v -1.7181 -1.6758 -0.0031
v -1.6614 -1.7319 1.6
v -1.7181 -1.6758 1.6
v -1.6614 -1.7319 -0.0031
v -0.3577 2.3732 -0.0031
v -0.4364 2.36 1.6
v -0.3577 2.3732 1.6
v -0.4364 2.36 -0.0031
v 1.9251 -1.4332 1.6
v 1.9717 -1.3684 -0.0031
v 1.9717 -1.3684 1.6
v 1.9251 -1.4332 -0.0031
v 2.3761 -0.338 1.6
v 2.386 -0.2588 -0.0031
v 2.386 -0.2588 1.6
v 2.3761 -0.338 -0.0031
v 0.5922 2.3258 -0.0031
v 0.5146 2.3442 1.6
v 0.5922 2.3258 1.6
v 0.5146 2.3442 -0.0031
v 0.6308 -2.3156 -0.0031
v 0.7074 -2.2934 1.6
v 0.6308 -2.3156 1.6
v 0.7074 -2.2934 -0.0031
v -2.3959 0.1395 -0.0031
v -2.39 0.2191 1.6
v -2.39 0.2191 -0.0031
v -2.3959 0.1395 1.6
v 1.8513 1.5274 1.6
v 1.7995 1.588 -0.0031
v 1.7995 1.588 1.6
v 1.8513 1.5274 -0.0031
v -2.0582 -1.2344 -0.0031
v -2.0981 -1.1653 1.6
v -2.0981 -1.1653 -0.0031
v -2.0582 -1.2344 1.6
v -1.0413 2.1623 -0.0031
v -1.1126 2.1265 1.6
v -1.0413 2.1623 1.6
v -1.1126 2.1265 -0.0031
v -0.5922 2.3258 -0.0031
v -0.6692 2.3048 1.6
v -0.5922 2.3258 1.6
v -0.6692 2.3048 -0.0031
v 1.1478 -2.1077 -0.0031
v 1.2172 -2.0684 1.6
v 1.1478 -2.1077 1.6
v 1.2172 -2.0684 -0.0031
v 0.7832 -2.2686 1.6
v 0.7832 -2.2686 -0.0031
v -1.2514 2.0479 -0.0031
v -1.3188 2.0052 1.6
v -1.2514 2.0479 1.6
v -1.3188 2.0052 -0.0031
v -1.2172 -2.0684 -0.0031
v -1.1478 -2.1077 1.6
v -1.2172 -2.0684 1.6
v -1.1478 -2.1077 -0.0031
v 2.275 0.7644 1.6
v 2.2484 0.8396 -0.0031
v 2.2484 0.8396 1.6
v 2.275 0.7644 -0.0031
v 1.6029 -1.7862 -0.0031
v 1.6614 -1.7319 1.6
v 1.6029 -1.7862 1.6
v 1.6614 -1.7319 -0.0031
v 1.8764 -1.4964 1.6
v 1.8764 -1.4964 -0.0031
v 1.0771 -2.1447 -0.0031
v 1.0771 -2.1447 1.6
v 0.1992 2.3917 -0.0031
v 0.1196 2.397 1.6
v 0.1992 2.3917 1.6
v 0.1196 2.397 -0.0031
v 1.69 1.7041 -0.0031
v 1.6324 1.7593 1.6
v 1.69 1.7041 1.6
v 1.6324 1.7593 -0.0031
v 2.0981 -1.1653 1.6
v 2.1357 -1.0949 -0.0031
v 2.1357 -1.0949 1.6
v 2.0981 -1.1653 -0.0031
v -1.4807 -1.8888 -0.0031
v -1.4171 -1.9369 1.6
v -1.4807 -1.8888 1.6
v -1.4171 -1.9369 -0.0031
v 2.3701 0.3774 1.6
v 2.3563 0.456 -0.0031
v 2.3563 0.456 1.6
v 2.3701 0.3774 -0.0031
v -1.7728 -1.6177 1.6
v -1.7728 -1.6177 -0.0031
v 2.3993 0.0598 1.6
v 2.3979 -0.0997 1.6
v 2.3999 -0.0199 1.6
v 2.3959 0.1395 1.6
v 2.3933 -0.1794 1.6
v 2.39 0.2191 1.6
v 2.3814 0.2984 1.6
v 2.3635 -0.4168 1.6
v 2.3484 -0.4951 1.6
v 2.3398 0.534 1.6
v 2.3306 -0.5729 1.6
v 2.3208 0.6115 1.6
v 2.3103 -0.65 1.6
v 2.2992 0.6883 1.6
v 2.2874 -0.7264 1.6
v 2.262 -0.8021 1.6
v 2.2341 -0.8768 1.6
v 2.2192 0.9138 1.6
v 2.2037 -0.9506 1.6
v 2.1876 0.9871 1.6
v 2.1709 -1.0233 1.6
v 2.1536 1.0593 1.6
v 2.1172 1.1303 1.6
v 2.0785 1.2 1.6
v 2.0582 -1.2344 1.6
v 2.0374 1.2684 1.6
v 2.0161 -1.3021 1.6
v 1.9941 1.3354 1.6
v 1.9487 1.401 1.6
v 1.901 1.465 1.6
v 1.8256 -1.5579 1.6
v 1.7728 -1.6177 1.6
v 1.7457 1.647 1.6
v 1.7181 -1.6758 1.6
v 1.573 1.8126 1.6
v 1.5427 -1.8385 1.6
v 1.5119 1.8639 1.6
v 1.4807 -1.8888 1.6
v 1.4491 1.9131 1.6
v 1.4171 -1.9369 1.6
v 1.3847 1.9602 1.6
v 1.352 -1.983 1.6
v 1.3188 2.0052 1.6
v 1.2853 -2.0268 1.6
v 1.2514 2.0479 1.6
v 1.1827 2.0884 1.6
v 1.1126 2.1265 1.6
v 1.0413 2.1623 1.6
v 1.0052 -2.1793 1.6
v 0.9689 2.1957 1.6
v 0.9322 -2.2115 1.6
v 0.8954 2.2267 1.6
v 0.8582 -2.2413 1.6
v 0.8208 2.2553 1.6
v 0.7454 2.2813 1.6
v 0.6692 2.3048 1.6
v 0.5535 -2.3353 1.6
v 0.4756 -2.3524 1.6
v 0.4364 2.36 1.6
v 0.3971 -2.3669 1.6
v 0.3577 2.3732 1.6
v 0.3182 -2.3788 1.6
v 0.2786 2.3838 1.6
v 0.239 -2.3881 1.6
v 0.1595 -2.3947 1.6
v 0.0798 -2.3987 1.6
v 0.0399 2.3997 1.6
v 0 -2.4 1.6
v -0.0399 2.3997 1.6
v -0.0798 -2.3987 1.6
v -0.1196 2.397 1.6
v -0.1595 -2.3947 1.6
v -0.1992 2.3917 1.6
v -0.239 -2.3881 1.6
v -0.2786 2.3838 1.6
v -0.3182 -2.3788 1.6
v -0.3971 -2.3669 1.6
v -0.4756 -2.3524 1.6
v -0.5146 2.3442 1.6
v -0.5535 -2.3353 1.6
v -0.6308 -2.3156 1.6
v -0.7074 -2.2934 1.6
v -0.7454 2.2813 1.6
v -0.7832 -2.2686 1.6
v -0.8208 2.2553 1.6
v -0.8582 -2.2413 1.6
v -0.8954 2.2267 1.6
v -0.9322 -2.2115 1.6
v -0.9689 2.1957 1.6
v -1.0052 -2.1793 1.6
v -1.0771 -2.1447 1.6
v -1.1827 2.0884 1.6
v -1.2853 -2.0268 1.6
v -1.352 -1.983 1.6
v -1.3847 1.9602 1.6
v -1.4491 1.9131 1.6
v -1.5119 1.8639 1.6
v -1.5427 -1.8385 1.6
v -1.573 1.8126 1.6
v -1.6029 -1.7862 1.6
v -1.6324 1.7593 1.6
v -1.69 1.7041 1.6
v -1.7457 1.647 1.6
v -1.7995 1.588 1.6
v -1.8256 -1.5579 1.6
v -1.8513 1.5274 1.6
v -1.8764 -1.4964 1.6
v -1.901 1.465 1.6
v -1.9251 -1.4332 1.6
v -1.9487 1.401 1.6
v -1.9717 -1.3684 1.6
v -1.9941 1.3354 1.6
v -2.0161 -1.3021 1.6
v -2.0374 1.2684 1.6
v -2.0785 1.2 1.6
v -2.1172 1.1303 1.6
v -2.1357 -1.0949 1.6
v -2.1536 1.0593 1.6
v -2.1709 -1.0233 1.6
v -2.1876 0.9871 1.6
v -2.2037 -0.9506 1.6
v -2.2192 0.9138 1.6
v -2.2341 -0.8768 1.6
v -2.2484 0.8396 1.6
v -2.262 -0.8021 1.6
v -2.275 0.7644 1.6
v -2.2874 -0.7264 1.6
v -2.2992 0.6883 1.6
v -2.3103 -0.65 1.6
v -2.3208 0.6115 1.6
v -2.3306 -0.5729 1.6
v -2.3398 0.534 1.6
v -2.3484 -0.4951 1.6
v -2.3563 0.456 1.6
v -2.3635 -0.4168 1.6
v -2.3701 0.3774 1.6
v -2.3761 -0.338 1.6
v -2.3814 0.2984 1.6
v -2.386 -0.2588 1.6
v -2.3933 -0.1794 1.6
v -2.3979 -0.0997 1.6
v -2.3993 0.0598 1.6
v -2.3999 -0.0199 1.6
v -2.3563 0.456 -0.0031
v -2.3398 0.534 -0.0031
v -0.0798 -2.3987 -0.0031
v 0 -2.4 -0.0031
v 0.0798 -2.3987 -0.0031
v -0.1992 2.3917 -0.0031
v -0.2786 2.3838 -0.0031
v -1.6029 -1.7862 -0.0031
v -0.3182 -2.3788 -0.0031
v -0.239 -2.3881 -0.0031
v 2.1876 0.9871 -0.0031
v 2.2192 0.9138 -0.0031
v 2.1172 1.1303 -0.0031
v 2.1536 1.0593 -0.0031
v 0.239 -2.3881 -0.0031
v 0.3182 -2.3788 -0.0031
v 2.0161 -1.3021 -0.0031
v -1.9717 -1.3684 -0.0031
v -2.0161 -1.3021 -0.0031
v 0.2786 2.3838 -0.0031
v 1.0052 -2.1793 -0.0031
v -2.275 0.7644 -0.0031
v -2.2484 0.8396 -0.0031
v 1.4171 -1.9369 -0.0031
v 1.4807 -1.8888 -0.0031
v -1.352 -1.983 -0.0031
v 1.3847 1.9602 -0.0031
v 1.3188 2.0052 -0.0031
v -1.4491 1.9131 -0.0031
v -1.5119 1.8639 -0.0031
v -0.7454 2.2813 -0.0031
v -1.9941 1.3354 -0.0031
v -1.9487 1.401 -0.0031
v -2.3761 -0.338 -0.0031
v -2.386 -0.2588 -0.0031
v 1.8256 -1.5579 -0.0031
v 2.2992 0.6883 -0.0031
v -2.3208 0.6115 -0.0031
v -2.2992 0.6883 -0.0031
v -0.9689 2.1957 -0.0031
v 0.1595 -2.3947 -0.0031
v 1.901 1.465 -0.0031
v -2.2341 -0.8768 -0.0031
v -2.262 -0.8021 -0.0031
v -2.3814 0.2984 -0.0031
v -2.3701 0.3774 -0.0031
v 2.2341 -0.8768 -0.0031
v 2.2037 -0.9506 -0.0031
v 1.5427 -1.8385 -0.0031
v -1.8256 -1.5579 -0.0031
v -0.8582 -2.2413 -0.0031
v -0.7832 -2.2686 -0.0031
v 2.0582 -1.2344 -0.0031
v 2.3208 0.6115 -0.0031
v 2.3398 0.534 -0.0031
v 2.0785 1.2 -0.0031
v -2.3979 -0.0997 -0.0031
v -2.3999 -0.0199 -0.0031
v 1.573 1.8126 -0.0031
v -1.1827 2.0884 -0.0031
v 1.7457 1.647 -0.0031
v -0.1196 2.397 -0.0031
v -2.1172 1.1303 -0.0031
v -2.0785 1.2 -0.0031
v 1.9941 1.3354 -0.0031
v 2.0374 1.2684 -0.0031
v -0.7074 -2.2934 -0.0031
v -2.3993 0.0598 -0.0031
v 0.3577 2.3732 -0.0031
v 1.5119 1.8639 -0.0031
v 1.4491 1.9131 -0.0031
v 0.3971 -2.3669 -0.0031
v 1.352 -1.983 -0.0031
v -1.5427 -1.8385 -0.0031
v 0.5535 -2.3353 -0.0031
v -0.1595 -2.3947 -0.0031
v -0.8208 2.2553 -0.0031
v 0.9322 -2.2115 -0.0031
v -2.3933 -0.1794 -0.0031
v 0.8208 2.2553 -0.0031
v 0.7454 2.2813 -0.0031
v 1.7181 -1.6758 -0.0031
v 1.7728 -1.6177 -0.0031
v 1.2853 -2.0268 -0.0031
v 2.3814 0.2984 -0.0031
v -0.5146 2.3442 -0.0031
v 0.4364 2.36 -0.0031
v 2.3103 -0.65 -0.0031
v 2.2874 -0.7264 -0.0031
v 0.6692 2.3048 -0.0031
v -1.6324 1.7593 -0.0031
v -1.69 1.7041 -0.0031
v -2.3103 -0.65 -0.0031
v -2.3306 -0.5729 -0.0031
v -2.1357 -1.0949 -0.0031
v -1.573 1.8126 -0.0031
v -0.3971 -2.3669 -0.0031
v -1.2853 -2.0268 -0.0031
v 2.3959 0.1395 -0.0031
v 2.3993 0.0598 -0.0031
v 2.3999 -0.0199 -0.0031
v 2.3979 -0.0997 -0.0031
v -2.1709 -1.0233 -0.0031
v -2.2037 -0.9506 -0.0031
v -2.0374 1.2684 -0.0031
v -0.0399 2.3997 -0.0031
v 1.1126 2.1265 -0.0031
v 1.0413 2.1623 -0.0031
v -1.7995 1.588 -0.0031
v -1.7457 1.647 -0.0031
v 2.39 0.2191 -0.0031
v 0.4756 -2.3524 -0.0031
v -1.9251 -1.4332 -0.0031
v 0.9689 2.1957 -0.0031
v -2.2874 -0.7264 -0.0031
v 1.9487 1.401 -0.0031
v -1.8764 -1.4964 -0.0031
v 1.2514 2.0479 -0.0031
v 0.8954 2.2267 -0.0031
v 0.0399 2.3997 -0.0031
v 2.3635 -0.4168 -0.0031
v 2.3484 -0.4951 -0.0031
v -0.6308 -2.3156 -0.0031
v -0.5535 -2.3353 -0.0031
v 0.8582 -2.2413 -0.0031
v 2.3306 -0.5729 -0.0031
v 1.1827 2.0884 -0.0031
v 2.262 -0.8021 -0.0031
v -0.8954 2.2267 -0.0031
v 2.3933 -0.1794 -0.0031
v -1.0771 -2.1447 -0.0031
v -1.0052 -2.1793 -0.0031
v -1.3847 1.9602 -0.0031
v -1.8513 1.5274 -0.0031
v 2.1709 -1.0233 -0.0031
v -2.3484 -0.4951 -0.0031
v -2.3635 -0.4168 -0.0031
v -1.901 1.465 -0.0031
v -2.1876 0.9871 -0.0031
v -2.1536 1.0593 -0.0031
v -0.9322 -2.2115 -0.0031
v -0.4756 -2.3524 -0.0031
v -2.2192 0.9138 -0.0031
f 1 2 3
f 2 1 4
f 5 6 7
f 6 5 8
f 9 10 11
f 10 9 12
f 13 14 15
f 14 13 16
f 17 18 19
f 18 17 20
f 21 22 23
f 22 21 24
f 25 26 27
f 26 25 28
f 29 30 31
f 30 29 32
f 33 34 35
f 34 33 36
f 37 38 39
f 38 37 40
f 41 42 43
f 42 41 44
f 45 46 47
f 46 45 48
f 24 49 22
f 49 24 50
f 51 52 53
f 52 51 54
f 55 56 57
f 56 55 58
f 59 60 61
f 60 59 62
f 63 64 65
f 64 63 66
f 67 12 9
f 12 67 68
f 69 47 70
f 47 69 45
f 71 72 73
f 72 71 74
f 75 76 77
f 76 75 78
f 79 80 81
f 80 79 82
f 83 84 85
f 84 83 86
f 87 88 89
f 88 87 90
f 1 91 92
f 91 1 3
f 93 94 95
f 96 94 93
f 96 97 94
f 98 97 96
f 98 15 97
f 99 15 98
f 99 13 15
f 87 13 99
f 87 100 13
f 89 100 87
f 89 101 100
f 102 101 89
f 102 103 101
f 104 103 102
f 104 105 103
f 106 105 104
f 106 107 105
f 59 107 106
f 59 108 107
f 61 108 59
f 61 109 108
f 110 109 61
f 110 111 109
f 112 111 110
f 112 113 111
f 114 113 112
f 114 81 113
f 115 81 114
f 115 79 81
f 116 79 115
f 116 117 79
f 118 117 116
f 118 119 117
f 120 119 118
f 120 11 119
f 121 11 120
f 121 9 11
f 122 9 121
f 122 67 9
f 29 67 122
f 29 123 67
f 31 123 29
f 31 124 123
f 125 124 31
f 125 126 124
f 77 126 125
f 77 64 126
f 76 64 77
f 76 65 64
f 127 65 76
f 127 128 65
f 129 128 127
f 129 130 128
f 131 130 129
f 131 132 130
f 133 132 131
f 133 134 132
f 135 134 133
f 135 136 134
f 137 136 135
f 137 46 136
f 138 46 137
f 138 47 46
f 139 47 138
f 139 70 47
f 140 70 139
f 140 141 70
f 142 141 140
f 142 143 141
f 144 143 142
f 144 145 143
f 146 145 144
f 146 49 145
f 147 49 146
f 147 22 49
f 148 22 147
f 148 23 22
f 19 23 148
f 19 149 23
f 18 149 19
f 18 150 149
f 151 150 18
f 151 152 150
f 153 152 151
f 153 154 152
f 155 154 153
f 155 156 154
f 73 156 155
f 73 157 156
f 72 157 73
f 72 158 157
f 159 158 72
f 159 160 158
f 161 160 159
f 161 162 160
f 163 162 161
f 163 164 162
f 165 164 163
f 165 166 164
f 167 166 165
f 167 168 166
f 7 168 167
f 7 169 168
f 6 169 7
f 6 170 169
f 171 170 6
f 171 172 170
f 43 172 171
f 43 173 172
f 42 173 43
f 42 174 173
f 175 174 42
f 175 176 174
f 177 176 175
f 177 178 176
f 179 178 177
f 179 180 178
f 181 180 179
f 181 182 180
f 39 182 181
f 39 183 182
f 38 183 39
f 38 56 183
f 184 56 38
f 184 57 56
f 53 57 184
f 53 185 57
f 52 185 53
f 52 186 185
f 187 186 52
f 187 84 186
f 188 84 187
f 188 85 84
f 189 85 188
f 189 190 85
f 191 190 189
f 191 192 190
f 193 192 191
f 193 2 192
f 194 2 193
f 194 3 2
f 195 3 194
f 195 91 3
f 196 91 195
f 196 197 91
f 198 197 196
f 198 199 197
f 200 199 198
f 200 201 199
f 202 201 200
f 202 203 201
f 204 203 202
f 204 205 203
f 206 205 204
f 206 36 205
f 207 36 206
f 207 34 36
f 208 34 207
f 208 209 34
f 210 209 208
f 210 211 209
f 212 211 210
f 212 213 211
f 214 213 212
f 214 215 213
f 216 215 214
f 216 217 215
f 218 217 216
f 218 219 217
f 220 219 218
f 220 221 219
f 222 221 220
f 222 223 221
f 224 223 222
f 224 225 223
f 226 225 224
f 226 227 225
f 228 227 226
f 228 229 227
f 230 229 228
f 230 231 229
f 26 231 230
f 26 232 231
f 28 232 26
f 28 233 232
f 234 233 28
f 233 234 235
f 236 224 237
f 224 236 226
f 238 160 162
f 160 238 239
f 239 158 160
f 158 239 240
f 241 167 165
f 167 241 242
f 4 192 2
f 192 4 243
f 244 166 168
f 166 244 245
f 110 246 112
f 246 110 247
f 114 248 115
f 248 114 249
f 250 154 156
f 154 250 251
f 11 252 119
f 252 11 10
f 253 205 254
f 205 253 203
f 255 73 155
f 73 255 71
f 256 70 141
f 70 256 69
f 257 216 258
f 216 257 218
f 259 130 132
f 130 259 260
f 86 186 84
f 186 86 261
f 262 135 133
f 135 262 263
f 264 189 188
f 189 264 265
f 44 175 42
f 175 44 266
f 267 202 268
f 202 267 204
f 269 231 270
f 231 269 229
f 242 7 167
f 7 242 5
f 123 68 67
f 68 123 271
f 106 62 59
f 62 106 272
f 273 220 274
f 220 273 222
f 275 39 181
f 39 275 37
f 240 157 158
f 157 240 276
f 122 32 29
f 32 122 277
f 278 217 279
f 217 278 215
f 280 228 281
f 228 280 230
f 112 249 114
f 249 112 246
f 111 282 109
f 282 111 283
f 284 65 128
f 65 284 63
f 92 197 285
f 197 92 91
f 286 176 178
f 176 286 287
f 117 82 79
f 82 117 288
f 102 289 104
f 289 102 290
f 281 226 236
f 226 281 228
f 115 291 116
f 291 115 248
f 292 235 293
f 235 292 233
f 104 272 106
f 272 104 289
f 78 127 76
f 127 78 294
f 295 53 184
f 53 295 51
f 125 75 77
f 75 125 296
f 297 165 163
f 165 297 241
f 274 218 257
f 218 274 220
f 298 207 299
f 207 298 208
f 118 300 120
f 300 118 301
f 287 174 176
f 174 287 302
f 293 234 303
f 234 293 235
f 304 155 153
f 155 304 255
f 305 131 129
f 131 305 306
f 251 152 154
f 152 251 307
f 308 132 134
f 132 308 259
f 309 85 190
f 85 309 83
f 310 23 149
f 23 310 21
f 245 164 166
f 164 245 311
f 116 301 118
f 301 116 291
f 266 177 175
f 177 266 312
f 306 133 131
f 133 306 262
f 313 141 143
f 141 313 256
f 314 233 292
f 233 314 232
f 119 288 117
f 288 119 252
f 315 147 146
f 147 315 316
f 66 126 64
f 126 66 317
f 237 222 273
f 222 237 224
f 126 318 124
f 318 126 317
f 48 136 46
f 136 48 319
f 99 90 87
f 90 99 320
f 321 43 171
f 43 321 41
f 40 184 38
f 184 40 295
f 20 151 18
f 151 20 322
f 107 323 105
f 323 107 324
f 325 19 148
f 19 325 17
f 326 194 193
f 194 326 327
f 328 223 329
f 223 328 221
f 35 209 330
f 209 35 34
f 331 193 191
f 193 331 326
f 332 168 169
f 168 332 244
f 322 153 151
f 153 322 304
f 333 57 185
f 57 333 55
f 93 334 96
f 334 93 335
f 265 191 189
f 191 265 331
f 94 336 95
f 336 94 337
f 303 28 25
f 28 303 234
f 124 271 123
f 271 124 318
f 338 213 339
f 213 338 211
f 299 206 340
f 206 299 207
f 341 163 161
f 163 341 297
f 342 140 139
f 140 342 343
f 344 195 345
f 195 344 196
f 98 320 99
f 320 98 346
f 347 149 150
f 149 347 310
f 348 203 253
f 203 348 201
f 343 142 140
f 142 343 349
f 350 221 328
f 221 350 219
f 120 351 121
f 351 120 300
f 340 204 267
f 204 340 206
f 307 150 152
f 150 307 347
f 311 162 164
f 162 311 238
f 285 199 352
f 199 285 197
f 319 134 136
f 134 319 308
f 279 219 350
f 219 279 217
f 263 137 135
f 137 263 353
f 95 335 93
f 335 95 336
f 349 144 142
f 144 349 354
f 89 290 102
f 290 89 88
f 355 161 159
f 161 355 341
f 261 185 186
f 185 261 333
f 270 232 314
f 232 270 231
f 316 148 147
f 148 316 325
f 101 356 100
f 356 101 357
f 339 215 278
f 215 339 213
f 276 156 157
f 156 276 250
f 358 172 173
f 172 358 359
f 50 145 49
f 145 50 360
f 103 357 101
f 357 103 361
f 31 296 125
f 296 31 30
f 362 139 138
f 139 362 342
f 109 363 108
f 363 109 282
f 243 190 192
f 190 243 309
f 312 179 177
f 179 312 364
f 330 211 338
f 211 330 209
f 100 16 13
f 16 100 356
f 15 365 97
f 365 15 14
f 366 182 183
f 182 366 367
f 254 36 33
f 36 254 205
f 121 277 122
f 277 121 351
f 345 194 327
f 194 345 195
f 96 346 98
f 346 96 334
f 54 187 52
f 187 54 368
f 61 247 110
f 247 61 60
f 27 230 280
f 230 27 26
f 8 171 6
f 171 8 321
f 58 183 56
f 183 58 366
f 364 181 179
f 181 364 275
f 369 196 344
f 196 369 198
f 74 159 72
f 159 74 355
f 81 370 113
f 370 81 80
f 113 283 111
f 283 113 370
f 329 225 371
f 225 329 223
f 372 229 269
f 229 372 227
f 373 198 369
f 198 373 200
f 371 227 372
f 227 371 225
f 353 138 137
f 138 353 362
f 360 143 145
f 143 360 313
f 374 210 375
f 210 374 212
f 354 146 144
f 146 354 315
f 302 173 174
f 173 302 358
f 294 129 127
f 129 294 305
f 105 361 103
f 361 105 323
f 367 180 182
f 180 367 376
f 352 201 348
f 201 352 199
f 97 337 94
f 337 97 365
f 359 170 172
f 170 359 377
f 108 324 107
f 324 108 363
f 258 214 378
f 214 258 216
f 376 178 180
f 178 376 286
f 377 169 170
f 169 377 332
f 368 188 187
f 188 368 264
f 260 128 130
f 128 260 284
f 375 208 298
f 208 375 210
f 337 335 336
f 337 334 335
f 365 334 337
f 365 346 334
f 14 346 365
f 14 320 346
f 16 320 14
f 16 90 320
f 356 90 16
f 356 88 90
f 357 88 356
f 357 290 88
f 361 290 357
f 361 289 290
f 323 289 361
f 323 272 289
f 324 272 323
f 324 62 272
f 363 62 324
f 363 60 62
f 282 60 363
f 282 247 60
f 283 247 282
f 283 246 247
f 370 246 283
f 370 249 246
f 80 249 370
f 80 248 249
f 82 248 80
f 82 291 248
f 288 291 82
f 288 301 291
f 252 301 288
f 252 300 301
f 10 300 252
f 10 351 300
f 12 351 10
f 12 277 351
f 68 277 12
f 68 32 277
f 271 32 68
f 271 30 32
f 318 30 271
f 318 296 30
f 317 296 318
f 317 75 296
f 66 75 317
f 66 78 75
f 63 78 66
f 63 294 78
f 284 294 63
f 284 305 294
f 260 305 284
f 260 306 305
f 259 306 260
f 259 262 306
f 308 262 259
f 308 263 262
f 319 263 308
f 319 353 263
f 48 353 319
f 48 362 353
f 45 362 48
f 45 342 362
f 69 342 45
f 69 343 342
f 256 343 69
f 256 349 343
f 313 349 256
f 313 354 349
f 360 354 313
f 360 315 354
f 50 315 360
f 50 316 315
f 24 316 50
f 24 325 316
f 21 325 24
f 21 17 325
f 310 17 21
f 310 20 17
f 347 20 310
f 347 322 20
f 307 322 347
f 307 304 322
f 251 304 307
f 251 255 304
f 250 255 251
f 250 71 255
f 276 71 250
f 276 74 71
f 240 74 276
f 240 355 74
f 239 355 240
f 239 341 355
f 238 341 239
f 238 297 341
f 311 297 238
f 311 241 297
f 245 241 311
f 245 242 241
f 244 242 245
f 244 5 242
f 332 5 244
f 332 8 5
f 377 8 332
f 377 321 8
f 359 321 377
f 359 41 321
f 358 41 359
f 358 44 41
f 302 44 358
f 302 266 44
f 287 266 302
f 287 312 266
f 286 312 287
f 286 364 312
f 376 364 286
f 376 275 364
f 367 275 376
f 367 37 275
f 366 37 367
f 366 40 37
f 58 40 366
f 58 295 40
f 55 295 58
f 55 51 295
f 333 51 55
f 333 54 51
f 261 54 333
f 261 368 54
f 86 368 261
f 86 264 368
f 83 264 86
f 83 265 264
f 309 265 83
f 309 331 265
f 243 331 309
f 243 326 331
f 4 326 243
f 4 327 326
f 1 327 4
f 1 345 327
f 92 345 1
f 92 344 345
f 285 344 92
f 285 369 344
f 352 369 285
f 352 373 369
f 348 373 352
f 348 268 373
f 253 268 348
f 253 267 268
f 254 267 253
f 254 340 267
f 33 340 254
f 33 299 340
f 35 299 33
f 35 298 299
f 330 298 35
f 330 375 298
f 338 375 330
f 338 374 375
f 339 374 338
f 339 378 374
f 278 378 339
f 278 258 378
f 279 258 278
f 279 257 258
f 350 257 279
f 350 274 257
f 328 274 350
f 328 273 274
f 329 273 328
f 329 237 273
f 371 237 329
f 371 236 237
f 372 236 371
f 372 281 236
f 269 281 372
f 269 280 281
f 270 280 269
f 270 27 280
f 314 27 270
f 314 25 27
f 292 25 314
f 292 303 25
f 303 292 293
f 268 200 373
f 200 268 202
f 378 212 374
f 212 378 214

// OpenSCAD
use <../lib.scad>
use <s/3960pb3s01.scad>
use <s/3960s01.scad>
use <s/3960s05.scad>
$fa=1; $fs=0.2;
function ldraw_lib__3960pb3(realsolid=false) = [
// 0 Dish  4 x  4 Inverted with Black and Metallic Silver Vault Door Pattern
// 0 Name: 3960pb3.dat
// 0 Author: Gerald Lasser [GeraldLasser]
// 0 !LDRAW_ORG Part UPDATE 2020-02
// 0 !LICENSE Licensed under CC BY 2.0 and CC BY 4.0 : see CAreadme.txt
// 
// 0 BFC CERTIFY CCW
  [0,"BFC","CERTIFY"],
  [0,"BFC","CCW"],
// 
// 0 !KEYWORDS Bricklink 3960pb009
// 
// 0 !CMDLINE -c71
// 
// 0 !HISTORY 2020-09-05 [PTadmin] Official Update 2020-02
// 
// 
// 1 16 0 0 0 1 0 0 0 1 0 0 0 1 s\3960s01.dat
  [1,16,0,0,0,1,0,0,0,1,0,0,0,1, ldraw_lib__s__3960s01(realsolid)],
// 
// 1 16 0 0 0 1 0 0 0 1 0 0 0 1 s\3960pb3s01.dat
  [1,16,0,0,0,1,0,0,0,1,0,0,0,1, ldraw_lib__s__3960pb3s01(realsolid)],
// 1 16 0 0 0 1 0 0 0 1 0 0 0 -1 s\3960pb3s01.dat
  [1,16,0,0,0,1,0,0,0,1,0,0,0,-1, ldraw_lib__s__3960pb3s01(realsolid)],
// 
// 1 16 0 0 0 1 0 0 0 1 0 0 0 1 s\3960s05.dat
  [1,16,0,0,0,1,0,0,0,1,0,0,0,1, ldraw_lib__s__3960s05(realsolid)],
];
module ldraw_lib__3960pb3(step=0, col=false, unit=2/5, alt=false, line=0.2, solid=!$preview)
    makepoly(ldraw_lib__3960pb3(solid), step=step, col=col, unit=unit, alt=alt, line=line, solid=solid);
ldraw_lib__3960pb3(line=0.2);
